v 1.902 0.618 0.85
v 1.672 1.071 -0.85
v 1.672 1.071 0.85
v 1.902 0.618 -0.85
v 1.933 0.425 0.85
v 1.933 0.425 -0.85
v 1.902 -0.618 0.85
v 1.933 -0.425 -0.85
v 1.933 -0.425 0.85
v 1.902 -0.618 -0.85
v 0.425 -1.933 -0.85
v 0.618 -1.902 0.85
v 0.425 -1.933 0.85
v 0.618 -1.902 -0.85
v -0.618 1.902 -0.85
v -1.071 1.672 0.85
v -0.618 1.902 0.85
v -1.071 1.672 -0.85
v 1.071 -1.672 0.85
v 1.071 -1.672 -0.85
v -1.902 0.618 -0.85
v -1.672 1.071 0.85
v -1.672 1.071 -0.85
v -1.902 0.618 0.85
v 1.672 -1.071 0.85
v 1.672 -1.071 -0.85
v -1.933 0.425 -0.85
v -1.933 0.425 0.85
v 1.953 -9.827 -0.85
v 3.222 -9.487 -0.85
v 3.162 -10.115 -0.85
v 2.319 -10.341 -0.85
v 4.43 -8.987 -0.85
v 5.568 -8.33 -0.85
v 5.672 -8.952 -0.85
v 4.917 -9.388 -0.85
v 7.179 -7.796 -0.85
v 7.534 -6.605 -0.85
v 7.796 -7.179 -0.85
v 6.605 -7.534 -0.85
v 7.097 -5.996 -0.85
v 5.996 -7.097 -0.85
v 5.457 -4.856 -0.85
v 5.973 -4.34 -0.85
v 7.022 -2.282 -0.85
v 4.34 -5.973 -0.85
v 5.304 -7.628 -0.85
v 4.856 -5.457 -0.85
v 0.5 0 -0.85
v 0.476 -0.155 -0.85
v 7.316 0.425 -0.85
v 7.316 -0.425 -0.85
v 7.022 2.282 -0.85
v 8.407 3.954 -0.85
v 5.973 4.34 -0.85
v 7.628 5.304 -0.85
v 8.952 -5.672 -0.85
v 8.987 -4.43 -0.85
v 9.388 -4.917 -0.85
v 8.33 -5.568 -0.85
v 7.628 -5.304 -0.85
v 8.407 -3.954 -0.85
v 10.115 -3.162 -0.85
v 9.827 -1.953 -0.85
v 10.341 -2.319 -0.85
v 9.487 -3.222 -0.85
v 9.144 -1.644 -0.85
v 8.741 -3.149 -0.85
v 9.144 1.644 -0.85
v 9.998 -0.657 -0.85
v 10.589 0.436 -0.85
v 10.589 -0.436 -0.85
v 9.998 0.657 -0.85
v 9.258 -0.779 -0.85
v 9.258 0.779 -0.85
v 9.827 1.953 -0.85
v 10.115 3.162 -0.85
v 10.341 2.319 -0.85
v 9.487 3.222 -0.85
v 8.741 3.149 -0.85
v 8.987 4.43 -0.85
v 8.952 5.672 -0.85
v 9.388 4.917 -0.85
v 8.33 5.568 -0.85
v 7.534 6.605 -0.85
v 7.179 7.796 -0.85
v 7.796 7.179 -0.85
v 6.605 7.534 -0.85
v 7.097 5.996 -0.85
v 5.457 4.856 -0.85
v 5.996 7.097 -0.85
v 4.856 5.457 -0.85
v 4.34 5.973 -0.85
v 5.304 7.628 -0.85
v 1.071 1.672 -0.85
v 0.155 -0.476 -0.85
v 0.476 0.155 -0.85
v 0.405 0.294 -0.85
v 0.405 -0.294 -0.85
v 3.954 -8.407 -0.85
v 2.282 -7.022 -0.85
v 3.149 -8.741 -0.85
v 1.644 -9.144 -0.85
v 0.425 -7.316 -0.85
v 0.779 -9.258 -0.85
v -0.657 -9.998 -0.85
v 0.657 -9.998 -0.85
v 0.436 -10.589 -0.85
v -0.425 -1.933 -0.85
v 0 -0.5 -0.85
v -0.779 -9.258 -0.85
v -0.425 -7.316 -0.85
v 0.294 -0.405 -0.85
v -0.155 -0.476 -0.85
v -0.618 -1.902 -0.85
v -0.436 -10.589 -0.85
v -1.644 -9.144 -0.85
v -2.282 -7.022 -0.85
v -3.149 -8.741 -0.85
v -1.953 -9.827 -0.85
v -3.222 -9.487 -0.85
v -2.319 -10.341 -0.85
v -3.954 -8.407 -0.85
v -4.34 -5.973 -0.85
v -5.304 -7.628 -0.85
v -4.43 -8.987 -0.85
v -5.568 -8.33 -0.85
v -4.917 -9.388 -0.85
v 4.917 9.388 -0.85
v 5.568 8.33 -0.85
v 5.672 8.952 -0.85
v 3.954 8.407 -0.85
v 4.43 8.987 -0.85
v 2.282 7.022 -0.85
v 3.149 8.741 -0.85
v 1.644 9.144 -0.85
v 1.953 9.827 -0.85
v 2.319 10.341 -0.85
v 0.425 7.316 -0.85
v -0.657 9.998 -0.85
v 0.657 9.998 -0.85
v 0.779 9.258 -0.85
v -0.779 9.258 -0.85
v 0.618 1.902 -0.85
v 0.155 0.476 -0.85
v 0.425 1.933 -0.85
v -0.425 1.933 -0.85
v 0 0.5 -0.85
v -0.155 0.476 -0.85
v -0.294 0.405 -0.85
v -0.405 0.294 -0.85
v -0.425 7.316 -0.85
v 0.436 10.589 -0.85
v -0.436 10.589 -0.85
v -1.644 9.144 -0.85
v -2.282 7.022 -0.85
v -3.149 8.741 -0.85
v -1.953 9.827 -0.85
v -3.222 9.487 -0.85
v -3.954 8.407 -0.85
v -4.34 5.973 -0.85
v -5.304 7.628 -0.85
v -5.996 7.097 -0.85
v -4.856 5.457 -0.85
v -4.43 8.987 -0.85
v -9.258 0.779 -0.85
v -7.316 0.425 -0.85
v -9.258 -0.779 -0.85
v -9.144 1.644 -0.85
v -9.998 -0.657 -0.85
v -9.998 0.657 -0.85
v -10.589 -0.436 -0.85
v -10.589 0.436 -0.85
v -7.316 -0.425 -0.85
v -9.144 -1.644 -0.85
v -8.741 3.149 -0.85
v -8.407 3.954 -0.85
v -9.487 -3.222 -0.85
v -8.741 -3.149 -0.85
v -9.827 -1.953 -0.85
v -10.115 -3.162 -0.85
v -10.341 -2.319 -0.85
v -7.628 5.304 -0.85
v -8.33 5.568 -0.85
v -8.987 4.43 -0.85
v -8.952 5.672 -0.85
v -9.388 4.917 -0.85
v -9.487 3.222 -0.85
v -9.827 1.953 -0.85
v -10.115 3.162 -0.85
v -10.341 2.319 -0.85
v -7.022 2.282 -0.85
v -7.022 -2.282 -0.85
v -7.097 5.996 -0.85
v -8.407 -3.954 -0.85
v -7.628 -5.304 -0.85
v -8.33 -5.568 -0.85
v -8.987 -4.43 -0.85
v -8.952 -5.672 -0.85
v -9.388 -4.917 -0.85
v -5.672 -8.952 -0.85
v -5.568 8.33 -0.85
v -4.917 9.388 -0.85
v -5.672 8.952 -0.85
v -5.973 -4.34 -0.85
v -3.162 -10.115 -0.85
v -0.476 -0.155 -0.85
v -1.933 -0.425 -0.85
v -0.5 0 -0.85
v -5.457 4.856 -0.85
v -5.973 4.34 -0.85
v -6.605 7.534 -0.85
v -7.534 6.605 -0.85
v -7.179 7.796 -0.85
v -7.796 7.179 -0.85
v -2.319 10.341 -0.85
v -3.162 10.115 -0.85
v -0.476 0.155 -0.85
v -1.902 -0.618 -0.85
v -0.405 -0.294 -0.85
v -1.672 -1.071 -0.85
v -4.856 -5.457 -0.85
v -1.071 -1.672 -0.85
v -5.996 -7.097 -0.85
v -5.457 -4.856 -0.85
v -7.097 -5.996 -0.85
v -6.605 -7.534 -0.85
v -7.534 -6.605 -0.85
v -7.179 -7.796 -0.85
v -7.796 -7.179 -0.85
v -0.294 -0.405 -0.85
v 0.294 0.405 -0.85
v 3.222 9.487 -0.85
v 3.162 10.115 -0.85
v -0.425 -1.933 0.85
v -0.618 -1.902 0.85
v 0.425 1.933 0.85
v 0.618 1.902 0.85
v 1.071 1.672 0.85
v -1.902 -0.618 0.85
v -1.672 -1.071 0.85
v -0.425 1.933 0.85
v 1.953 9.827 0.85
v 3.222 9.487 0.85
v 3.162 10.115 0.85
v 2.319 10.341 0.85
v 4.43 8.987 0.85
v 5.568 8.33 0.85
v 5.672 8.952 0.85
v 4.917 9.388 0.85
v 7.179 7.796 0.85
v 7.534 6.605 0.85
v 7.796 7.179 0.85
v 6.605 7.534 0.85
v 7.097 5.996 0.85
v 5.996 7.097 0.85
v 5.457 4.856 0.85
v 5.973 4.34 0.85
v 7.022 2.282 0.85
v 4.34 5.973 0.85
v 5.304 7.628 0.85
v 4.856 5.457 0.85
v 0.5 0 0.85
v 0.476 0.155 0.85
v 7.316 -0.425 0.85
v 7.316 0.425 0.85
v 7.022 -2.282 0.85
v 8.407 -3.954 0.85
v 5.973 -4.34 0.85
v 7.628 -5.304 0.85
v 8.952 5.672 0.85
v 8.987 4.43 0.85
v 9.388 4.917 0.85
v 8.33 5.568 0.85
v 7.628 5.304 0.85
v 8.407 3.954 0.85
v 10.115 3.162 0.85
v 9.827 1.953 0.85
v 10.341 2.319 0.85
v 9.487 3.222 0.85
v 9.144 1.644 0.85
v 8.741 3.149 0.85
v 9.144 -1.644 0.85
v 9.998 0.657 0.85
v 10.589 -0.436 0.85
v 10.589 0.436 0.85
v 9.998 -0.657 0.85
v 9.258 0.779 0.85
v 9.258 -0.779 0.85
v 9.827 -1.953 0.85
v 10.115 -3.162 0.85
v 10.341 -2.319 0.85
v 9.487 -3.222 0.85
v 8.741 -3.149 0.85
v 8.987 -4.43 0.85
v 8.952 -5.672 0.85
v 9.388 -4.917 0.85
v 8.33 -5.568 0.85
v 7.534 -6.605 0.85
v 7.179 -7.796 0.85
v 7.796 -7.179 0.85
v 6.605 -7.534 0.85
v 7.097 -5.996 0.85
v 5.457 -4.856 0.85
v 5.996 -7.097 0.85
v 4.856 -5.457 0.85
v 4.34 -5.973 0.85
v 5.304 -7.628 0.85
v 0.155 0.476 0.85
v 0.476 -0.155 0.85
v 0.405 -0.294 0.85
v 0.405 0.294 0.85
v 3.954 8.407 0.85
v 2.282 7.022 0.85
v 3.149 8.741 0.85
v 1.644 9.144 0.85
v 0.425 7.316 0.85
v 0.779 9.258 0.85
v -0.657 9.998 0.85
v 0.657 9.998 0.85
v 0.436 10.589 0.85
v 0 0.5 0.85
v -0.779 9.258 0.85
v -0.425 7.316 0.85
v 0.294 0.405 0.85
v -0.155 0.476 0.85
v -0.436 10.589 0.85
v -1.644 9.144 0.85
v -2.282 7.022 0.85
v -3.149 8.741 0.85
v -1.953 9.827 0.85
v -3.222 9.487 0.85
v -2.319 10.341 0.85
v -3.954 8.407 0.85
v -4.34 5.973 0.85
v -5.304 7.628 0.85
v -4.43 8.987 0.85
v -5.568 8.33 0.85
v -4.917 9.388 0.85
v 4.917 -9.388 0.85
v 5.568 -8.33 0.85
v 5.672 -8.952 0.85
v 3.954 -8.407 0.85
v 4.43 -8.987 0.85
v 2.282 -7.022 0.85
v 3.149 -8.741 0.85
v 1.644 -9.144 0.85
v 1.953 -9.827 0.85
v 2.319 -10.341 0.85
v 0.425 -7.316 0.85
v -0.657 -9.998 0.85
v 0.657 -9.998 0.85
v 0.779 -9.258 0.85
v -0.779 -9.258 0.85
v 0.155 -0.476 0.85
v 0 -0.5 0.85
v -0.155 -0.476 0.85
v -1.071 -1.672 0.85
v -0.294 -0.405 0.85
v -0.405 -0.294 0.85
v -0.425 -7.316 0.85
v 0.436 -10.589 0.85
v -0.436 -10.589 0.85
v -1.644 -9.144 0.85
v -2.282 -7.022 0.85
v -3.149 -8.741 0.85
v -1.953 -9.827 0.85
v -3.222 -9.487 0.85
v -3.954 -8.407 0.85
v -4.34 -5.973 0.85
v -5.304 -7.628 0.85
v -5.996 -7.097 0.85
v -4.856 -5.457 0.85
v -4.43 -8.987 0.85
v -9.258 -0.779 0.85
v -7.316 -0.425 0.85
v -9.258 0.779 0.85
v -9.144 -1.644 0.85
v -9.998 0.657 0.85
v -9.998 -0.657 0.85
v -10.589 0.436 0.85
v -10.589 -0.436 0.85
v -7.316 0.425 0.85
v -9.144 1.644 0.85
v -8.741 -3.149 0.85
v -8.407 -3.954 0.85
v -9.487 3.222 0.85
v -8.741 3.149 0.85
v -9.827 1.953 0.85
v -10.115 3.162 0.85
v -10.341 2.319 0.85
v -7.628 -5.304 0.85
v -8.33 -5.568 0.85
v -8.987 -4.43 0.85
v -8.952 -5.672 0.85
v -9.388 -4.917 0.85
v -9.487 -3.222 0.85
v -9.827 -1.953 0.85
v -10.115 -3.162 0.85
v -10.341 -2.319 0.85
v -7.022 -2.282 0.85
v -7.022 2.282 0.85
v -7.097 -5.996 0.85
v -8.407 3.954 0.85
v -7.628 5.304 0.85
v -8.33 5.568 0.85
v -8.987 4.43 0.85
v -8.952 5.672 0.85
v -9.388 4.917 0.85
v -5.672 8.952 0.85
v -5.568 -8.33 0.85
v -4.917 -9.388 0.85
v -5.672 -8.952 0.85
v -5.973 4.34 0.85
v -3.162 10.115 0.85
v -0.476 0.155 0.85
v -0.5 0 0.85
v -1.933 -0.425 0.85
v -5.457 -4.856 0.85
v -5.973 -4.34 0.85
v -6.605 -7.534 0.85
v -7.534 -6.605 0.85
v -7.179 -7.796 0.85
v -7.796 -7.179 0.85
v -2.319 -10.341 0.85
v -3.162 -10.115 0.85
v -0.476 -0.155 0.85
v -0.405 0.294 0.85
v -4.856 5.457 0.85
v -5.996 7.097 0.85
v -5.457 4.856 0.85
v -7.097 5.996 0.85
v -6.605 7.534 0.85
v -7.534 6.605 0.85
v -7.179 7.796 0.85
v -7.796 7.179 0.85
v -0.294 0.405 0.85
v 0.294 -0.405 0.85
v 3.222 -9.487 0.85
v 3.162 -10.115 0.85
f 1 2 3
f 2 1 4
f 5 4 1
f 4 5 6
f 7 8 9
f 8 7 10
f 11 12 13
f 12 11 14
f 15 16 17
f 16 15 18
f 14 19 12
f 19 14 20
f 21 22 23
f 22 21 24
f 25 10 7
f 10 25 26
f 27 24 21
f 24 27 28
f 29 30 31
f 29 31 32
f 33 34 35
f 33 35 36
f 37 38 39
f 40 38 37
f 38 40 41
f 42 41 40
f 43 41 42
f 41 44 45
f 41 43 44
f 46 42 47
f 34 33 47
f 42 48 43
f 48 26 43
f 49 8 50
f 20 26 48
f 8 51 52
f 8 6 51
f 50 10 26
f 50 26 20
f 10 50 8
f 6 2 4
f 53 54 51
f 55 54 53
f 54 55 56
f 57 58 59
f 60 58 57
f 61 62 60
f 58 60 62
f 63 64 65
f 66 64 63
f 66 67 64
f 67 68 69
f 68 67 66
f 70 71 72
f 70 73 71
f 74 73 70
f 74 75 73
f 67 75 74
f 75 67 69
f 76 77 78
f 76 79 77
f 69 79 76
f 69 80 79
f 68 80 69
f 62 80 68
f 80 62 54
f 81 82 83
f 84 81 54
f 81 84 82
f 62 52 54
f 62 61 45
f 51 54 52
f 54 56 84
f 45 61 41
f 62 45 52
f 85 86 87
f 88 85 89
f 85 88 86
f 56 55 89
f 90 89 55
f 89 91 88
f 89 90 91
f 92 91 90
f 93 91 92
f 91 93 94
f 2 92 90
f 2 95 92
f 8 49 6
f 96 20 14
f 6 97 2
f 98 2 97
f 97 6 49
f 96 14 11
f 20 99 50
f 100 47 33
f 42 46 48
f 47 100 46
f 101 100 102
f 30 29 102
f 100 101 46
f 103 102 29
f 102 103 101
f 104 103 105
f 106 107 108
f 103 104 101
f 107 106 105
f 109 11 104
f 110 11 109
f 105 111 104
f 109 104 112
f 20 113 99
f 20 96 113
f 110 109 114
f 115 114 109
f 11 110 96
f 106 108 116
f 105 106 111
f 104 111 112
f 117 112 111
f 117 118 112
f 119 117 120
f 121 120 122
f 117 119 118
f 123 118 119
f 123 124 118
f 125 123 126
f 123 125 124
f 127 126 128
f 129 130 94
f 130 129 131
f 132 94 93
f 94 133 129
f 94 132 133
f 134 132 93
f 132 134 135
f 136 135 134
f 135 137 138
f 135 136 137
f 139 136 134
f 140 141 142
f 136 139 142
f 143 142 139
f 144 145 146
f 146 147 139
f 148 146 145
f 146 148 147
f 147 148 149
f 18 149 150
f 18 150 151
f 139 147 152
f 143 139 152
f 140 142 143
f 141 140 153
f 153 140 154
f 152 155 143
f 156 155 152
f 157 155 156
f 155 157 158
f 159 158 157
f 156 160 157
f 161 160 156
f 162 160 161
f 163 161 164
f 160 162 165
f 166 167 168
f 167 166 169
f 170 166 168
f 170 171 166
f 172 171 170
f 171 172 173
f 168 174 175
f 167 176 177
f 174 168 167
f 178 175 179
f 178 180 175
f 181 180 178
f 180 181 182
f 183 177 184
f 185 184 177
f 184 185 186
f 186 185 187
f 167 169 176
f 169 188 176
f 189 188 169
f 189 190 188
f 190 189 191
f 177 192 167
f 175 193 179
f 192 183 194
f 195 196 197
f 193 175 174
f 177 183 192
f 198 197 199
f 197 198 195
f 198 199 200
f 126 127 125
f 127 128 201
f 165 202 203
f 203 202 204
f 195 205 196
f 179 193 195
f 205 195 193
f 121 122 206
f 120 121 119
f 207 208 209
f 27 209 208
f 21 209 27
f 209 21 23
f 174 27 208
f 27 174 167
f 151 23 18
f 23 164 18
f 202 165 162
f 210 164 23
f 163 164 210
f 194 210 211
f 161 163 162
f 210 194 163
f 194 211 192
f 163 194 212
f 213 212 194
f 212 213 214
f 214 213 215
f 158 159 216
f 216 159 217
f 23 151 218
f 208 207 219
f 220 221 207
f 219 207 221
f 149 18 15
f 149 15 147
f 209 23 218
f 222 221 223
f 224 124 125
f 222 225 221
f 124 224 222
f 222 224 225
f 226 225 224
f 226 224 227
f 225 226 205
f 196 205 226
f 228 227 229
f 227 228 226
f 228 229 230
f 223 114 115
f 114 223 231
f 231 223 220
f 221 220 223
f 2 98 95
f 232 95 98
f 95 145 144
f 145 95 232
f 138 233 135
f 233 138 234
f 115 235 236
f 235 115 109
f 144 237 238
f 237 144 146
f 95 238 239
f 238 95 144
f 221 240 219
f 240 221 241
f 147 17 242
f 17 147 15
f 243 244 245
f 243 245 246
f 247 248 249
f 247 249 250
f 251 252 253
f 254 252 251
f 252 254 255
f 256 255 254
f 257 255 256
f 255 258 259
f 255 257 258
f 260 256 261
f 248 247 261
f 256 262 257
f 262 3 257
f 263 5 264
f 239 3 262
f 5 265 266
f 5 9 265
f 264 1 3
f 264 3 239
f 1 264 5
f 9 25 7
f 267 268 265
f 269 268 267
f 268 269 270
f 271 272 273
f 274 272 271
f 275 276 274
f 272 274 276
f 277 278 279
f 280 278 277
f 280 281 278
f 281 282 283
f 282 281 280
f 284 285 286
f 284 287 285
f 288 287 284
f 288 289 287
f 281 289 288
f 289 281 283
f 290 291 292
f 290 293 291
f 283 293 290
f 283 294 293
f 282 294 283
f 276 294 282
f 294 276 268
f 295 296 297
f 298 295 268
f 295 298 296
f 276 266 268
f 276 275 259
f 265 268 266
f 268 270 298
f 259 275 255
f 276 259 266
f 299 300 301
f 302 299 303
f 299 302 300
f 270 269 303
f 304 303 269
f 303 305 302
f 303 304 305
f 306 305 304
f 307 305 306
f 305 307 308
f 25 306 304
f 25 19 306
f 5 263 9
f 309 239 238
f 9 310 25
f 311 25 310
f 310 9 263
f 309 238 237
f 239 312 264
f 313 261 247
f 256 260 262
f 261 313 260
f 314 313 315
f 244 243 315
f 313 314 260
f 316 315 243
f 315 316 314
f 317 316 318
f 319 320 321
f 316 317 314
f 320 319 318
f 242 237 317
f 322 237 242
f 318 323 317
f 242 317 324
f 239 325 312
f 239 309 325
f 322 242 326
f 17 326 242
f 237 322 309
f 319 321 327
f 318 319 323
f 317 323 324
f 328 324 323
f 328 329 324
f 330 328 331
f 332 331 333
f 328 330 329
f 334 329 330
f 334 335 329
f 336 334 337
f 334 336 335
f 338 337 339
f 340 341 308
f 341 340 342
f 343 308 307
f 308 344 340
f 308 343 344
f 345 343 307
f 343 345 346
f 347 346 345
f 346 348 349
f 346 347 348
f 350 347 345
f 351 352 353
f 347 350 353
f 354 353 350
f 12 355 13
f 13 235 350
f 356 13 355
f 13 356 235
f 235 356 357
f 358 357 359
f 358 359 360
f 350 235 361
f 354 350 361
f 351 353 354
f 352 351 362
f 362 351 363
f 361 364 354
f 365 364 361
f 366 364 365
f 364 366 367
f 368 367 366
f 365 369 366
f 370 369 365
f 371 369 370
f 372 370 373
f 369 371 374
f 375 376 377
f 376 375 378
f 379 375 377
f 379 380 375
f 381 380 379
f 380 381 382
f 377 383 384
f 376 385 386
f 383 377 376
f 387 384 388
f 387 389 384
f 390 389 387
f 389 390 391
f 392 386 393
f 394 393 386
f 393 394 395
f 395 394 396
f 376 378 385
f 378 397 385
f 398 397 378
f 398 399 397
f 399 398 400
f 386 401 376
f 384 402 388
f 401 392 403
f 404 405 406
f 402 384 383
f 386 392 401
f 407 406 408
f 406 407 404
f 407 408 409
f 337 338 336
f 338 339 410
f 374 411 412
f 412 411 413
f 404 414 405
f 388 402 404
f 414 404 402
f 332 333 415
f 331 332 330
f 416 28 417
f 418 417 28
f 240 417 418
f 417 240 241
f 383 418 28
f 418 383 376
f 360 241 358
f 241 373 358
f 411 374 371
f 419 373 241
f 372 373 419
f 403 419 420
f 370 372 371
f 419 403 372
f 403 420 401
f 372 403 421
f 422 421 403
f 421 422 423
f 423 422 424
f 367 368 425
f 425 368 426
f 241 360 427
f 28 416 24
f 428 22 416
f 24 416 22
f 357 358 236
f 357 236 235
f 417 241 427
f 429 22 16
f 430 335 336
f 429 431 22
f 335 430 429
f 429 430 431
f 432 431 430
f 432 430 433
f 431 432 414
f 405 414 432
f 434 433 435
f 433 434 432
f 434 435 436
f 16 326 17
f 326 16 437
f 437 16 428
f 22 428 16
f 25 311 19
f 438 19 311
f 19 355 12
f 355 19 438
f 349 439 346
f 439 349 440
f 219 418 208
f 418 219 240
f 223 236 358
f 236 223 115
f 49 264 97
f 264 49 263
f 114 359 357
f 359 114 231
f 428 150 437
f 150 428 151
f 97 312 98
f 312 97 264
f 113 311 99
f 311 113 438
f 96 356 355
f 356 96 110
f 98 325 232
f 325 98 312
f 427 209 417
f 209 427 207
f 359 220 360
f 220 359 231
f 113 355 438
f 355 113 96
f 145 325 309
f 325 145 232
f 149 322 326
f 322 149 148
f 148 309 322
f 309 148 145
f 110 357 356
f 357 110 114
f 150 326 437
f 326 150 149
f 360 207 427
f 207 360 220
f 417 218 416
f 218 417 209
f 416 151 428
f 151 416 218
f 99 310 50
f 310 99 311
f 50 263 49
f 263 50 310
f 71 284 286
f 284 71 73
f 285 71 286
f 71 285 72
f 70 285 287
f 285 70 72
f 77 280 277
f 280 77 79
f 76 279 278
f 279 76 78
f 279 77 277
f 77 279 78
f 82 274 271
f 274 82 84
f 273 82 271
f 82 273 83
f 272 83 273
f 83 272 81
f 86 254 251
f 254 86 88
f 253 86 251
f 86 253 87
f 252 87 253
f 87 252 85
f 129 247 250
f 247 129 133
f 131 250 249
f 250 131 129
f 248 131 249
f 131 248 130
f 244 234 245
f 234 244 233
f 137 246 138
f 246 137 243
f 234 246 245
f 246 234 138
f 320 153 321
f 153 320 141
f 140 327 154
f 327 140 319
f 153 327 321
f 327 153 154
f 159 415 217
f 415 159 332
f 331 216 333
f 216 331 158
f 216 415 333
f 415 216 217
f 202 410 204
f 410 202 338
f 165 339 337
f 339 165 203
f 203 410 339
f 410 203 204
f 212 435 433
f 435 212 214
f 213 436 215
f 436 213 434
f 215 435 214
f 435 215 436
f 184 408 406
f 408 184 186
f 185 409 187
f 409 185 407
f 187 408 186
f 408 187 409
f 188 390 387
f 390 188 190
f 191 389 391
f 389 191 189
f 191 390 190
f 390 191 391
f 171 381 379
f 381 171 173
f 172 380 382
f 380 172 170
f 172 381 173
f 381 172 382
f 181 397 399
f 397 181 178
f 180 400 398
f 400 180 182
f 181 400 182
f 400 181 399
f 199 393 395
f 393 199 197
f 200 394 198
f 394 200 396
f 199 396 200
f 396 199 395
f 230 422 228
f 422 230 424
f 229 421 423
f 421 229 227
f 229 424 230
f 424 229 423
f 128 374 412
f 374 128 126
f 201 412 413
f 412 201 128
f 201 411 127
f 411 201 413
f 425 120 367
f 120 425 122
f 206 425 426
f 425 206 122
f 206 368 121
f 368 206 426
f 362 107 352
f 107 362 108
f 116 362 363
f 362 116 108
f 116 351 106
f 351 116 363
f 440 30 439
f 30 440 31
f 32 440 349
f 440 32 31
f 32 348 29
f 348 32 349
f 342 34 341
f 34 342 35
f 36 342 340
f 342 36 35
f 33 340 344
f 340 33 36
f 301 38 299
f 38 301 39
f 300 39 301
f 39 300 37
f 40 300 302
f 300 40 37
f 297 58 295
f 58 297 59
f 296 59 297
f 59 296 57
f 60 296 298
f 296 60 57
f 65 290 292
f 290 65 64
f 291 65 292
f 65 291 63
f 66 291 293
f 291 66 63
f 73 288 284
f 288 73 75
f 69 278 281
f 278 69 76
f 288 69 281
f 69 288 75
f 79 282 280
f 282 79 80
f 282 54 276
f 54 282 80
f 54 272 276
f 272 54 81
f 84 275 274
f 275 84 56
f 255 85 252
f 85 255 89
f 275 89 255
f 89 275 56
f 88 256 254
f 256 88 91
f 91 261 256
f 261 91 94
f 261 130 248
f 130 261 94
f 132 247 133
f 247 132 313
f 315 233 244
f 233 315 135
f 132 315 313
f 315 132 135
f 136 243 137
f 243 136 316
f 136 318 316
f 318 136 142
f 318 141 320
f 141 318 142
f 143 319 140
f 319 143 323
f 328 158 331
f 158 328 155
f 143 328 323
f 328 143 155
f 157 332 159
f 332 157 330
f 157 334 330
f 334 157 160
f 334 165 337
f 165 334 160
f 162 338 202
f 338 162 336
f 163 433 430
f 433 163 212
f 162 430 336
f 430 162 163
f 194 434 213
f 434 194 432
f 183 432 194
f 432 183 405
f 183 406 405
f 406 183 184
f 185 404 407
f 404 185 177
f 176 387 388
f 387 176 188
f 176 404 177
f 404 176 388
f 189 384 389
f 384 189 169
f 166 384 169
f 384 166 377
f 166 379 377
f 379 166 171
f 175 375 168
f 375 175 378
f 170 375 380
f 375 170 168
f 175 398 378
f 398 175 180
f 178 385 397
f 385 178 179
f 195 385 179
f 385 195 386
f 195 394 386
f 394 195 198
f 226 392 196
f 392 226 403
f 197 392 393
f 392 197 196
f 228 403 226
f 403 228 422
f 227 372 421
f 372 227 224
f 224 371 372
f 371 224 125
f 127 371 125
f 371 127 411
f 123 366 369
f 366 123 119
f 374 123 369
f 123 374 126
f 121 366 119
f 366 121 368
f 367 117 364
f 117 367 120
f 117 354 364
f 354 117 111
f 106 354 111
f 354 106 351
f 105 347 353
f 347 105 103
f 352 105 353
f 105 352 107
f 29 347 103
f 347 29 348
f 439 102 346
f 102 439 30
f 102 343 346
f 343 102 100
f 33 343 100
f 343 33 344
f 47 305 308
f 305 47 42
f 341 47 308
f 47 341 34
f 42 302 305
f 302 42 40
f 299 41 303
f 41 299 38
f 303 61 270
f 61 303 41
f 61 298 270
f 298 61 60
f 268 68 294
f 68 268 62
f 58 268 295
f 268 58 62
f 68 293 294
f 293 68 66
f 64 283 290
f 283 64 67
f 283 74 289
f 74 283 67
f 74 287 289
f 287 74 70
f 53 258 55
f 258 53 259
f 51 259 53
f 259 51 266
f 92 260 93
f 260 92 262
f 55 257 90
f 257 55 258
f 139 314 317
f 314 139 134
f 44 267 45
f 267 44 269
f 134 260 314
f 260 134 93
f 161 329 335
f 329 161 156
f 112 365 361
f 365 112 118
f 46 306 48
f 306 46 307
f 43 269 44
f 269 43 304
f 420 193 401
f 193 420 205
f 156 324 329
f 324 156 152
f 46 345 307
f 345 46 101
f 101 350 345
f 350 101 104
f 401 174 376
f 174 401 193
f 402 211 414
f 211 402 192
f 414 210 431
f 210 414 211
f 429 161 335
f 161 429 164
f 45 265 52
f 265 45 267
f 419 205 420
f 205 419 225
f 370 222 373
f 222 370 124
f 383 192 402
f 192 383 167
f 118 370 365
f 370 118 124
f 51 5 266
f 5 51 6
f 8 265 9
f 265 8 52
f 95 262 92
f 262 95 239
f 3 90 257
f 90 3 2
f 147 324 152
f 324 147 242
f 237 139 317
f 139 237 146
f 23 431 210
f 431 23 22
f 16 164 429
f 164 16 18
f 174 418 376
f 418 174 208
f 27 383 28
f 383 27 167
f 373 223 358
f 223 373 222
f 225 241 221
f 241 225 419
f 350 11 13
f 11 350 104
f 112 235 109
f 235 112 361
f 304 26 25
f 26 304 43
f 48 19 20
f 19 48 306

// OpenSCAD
// file: Gear.scad
module gear(radius = 16, depth = 2, teeth = 10, spokes = 16) {
    // Central Hub
    difference() {
        cylinder(h = depth, r = 2, center = true);
        cylinder(h = depth + 1, r = 0.5, center = true);
    }

    // Outer Ring
    difference() {
        union() {
            cylinder(h = depth, r = radius, center = true);
            // Teeth Addendum
            for (i = [0 : 360 / teeth : 360 - 360 / teeth]) {
                rotate([0, 0, i])
                translate([radius, 0, 0])
                Addendum(radius / teeth * 3.14, depth);
            }
        }
        // Teeth Dedendum
        for (i = [360 / (2 * teeth) : 360 / teeth : 360]) {
            rotate([0, 0, i])
            translate([radius, 0, 0])
            Dedendum(radius / teeth * 3.14, depth + 1);
        }
        // Hole
        cylinder(h = depth + 1, r = radius - radius / teeth * 3.14 * 2 , center = true);
    }

    // Spokes
    for (i = [0 : 360 / spokes : 360 - 360 / spokes]) {
        rotate([0, 0, i])
        translate([radius/2, 0, 0])
        spoke(radius, depth);
    }
}

// Dedendum Module
module Dedendum(size, depth) {
    tooth_depth = size / 2 * 1.1;
    tooth_depth_width = size / 3;
    linear_extrude(height = depth, center = true)
    polygon(points = [[0, -size/2], [0, size/2], [-tooth_depth, tooth_depth_width], [-tooth_depth, -tooth_depth_width]]);
}

// Addendum Module
module Addendum(size, depth) {
    tooth_height = size / 2 * 0.9;
    tooth_depth_width = size/3;
    linear_extrude(height = depth, center = true)
    polygon(points = [[-tooth_depth_width*4, -size], [-tooth_depth_width*4, size], [tooth_height, tooth_depth_width], [tooth_height, -tooth_depth_width]]);
}

// Spoke Module
module spoke(radius, depth) {
    intersection()
    {
    cube([radius - 1.6, depth/2, depth], center = true);
    //rotate([0, 90, 0])
    //cylinder(h = radius *0.75, r = 0.75, center = true);
    }
}
// main file
$fn = 20; // Increase the resolution for smoother shapes

use <Gear.scad>

// Gear parameters
radius = 10;
depth = 1.7;
teeth = 24;
spokes = 8;

// First gear
rotate([0, 0, 0]) gear(radius, depth, teeth, spokes);
